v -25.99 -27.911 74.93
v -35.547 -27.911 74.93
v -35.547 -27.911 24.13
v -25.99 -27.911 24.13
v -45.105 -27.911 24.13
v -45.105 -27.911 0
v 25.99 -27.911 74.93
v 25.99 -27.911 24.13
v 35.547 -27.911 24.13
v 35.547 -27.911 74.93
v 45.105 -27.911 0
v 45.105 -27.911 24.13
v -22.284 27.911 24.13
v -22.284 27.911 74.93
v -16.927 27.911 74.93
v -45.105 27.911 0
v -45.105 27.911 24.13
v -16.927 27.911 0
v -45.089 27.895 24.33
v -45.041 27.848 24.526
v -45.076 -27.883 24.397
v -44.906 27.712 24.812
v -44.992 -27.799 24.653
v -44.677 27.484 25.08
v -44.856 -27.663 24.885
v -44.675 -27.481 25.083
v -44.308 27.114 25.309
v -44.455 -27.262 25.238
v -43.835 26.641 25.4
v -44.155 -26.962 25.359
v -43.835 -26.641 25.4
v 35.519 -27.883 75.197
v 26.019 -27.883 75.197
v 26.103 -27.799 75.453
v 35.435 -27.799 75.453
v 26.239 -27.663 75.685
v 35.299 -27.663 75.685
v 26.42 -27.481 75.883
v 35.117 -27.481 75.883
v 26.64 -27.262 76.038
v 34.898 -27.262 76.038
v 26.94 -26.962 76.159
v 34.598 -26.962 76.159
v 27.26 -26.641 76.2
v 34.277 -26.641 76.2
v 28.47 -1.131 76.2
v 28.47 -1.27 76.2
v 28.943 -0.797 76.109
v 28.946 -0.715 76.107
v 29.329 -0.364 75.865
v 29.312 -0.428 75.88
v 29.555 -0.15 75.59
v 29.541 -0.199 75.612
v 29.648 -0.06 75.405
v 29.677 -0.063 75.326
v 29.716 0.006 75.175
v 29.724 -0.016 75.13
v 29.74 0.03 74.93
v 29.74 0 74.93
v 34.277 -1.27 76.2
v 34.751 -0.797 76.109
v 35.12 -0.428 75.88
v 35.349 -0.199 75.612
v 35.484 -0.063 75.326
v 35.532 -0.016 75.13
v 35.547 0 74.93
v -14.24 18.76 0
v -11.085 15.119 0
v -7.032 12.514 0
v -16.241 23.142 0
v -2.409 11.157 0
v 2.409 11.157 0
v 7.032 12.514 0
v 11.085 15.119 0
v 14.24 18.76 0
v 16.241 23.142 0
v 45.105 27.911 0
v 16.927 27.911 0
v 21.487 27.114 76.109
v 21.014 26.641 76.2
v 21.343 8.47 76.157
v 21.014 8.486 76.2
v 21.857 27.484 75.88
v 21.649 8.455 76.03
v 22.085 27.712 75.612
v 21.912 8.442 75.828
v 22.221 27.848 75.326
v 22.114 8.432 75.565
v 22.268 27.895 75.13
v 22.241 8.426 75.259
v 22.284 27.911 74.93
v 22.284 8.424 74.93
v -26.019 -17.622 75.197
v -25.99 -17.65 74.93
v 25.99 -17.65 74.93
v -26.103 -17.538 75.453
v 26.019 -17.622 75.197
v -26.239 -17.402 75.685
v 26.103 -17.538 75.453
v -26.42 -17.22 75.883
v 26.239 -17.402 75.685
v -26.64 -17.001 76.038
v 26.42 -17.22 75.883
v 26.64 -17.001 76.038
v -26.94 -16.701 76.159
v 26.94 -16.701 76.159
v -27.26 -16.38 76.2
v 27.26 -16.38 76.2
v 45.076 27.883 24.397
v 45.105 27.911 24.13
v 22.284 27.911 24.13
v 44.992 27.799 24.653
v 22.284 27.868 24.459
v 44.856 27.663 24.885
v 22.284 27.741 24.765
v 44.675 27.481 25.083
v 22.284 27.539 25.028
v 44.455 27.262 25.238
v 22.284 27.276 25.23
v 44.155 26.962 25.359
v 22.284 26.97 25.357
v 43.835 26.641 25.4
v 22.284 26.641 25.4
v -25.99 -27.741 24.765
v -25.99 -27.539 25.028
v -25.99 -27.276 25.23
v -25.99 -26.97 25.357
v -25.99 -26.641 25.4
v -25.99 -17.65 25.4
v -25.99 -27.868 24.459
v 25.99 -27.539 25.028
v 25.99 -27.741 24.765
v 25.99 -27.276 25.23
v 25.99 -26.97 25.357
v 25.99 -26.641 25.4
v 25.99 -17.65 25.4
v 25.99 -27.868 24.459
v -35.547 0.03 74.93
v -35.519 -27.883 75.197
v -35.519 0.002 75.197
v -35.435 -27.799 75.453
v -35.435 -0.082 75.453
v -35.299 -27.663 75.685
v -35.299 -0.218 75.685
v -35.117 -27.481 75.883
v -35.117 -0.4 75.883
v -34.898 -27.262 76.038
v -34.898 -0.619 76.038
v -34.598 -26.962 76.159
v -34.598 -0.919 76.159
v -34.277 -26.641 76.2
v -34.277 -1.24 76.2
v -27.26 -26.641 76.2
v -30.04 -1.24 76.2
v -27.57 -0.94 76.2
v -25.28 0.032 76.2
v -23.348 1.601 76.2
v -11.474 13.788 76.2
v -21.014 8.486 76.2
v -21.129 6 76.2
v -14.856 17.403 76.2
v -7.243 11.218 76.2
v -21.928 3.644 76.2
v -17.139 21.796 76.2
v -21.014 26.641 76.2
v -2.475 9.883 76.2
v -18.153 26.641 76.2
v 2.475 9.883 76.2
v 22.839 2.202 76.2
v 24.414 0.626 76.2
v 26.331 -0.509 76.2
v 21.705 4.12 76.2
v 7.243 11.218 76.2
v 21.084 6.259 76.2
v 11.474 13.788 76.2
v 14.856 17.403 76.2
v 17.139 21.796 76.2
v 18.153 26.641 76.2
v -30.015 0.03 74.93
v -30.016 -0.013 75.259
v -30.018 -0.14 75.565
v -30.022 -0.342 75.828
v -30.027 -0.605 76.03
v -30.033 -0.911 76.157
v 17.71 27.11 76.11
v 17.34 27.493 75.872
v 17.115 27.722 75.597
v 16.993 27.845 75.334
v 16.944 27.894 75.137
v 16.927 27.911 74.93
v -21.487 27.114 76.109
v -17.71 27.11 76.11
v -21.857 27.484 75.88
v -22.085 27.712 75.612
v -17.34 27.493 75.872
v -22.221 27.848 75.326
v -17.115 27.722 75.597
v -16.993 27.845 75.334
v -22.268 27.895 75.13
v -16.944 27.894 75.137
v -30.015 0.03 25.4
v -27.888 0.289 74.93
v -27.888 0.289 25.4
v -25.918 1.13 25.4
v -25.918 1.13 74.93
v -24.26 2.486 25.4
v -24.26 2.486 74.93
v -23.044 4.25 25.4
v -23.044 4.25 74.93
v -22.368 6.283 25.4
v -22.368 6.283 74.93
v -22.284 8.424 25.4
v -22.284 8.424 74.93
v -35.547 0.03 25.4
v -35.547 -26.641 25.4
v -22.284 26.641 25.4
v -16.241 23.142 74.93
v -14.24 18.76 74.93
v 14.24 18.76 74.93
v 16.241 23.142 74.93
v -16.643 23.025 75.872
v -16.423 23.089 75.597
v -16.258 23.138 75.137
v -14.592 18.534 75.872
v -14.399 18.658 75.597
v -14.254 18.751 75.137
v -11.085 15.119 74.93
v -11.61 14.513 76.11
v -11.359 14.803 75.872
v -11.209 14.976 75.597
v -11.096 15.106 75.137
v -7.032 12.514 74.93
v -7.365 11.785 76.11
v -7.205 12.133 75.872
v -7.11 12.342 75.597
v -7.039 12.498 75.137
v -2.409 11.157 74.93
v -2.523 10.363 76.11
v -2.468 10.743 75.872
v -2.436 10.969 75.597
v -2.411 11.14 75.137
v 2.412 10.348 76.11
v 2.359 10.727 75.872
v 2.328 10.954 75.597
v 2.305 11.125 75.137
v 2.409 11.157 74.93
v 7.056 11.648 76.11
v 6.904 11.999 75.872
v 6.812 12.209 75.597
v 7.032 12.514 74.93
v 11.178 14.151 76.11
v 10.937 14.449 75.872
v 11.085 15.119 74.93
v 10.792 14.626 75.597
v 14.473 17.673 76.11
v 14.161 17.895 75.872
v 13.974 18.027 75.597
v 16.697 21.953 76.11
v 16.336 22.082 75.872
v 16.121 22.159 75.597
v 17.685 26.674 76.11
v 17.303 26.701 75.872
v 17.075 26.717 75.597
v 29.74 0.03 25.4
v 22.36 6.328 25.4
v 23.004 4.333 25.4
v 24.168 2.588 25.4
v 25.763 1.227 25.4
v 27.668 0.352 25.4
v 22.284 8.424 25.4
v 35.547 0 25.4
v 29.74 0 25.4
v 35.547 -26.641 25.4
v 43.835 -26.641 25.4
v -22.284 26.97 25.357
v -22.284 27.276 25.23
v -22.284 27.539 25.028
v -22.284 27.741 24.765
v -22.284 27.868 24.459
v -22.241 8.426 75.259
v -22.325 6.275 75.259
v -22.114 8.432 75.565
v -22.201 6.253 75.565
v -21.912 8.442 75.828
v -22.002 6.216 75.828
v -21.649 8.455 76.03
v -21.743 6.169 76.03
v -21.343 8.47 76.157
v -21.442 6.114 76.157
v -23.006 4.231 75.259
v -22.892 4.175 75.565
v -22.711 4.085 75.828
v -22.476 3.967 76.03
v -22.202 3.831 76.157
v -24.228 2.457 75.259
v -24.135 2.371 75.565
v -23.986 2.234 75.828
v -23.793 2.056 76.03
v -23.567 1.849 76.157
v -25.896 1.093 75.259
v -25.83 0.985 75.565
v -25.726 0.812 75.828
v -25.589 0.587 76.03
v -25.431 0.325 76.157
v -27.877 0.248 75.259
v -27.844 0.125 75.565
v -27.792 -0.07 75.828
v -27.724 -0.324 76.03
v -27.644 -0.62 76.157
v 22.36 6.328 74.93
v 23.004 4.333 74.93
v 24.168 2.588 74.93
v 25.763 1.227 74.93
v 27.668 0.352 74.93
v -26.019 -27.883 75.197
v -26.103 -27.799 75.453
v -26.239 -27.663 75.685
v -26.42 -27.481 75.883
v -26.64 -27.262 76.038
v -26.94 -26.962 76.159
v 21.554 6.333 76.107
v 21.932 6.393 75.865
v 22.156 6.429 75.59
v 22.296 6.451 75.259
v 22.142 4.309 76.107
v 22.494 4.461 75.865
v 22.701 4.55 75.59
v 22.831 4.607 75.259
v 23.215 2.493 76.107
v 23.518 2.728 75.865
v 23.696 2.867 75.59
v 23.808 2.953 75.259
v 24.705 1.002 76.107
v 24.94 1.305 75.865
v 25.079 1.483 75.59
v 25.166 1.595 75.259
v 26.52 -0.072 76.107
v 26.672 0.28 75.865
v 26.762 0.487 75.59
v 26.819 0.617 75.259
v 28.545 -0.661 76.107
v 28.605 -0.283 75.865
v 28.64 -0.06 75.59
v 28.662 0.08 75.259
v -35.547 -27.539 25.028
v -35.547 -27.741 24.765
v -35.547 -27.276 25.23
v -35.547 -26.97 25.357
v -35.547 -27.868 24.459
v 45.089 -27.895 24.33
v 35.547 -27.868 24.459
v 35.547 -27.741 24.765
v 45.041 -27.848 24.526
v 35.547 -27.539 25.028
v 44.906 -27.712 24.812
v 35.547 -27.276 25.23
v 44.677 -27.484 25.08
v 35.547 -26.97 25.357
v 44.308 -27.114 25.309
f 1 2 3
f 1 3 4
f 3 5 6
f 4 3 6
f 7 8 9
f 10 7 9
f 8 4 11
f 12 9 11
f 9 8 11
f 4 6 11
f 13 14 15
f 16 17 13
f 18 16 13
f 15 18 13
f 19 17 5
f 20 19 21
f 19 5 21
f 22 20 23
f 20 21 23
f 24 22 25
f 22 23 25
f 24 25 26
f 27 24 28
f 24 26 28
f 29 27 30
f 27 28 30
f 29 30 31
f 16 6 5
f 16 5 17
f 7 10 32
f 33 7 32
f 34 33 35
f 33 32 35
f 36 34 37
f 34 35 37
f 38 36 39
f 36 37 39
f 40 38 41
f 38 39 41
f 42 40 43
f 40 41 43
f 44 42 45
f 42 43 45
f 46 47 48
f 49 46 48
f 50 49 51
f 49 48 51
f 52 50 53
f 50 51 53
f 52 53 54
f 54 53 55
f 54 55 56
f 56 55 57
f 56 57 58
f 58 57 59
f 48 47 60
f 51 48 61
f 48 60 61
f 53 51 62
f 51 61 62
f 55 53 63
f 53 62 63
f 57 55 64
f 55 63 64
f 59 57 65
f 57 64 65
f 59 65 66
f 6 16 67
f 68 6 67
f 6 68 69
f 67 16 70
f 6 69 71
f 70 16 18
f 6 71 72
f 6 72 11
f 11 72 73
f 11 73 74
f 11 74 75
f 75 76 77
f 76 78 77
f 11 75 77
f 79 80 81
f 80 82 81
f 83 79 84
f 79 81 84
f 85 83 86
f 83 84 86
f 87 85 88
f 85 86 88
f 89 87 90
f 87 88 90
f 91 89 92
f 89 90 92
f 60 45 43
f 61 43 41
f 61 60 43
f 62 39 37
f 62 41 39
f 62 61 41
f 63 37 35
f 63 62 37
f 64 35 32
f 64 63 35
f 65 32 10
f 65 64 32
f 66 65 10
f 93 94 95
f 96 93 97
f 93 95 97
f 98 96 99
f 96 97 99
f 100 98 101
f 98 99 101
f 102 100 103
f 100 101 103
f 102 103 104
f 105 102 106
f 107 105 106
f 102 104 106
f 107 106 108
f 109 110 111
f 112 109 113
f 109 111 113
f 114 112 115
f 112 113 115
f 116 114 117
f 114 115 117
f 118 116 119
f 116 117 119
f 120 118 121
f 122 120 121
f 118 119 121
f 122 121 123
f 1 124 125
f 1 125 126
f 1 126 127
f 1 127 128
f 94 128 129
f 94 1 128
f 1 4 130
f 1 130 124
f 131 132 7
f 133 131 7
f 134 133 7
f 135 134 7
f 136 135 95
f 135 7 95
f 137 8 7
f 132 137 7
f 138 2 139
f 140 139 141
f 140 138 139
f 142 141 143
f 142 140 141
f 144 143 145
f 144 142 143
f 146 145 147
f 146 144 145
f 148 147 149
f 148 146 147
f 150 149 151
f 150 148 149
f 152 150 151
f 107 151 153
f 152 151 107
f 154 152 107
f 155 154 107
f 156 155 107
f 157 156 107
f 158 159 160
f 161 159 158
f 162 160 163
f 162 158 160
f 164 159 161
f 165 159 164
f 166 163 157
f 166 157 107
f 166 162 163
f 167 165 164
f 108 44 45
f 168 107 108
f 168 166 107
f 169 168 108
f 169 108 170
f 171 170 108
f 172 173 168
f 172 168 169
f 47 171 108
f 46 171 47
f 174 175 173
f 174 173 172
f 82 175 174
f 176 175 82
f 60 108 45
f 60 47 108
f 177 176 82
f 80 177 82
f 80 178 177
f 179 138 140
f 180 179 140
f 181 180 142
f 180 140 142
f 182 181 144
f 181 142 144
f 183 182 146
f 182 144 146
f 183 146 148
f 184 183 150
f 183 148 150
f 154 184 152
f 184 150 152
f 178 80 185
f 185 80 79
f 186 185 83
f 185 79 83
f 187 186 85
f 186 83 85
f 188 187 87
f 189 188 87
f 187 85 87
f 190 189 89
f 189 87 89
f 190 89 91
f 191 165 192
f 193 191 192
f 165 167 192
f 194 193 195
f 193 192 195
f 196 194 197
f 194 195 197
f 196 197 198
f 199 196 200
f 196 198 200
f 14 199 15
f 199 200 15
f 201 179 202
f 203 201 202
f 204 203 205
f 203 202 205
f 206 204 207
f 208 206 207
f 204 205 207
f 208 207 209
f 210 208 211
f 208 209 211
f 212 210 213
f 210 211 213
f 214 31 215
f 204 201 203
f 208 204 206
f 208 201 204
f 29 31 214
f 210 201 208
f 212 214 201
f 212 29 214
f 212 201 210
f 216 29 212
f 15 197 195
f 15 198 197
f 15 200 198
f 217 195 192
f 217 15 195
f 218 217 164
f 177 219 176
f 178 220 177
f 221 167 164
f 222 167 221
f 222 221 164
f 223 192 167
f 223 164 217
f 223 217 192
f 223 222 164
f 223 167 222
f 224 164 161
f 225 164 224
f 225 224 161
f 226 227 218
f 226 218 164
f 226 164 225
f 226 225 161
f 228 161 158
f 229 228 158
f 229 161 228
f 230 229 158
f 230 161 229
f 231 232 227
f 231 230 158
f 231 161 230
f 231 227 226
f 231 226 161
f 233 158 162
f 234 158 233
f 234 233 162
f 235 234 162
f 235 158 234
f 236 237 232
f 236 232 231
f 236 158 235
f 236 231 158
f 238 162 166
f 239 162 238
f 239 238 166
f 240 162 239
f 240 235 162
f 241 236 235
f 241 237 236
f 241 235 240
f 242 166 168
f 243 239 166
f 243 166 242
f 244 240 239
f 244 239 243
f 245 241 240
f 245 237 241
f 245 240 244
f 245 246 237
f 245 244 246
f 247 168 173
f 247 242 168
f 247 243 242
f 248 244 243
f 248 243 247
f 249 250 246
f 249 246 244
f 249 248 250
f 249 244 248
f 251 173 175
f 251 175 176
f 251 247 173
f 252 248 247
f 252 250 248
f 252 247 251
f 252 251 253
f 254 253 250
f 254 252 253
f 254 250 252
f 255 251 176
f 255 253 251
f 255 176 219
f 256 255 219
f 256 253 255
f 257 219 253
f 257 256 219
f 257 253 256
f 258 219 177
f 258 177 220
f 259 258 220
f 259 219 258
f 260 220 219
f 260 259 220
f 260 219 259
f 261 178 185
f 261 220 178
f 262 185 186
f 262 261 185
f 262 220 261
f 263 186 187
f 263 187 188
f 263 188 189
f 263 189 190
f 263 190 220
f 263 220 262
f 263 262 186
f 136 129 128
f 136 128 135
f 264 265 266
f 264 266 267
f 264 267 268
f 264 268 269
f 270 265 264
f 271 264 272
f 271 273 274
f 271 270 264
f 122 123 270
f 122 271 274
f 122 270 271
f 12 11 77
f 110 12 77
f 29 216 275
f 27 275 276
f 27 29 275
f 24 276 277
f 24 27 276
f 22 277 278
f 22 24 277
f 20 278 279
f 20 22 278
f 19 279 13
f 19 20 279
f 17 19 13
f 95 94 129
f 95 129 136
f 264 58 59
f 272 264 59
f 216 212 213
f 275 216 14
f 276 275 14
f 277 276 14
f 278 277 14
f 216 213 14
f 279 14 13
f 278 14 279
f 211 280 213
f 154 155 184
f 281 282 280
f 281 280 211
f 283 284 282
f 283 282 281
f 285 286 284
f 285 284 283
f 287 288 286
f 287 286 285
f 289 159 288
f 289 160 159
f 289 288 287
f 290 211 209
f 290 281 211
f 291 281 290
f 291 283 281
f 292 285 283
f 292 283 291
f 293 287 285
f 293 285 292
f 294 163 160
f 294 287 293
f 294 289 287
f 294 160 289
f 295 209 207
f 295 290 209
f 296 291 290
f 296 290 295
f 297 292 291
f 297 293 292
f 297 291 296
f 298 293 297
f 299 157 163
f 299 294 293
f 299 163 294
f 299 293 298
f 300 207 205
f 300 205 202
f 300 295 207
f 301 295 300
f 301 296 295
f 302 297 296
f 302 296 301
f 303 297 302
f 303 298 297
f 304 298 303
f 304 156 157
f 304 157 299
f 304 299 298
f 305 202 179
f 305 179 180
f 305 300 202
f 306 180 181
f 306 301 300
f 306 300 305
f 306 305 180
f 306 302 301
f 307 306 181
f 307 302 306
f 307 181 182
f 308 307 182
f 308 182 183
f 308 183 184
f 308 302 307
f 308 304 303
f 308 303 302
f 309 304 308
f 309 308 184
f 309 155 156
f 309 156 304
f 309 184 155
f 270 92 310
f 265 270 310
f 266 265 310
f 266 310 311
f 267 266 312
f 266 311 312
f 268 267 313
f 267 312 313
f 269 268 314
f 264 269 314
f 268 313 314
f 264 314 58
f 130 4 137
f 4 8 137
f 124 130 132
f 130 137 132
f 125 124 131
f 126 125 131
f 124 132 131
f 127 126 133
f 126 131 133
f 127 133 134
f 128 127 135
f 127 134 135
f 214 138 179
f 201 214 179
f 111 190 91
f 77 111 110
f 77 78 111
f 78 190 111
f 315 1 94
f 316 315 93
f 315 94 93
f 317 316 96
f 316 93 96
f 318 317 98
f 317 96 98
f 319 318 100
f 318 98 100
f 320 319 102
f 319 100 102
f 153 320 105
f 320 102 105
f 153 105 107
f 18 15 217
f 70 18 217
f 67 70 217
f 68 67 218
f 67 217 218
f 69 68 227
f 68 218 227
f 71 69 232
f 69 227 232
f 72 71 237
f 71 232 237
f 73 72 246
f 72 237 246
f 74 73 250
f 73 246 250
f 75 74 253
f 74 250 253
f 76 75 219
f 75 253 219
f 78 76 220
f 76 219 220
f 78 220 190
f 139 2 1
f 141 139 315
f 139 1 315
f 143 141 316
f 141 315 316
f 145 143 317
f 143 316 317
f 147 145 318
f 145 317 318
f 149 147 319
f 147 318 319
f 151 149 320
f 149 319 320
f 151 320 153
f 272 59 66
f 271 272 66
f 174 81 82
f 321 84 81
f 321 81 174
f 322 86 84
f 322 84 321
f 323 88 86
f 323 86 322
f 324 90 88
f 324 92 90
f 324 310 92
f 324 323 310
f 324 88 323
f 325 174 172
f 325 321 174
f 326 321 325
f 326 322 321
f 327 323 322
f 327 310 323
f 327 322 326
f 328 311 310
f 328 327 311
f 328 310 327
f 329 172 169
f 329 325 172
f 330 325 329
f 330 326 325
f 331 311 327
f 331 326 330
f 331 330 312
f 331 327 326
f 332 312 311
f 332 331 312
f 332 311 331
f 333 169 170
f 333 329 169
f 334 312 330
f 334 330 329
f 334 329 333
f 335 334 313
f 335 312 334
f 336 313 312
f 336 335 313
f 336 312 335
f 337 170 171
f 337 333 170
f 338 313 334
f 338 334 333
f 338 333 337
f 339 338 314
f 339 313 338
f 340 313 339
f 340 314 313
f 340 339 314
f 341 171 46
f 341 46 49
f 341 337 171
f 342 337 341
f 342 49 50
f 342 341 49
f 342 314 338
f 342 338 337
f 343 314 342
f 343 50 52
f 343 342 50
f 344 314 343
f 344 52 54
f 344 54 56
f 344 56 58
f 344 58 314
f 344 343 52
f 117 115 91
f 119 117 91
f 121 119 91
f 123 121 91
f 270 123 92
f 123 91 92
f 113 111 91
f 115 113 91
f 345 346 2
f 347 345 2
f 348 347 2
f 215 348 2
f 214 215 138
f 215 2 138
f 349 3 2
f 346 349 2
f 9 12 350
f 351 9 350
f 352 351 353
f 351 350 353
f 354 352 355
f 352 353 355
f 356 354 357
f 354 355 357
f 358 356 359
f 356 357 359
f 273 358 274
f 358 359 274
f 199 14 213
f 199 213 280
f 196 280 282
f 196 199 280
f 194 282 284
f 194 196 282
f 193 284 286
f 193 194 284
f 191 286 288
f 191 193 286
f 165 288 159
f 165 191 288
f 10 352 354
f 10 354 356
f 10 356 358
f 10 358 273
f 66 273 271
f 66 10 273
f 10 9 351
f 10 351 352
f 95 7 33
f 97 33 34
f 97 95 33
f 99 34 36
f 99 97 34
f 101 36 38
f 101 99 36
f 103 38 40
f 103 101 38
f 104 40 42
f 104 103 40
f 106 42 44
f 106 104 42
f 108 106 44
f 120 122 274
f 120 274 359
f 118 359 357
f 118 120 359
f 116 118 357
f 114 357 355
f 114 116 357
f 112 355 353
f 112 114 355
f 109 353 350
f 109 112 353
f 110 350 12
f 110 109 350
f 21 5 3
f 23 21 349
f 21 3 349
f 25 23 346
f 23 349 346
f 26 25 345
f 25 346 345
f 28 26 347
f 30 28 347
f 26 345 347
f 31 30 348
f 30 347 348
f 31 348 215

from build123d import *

# Parameters (mm, degrees)
F0_W     = 90.20937762
F0_H     = 55.82251726
F1_DEPTH = 76.2
F2_R     = 16.9269763234
F3_DEPTH = 76.2
F4_W     = 51.9804880023
F4_H     = 10.2611703347
F5_DEPTH = 50.8
F6_R     = 7.62
F7_DEPTH = 50.8
F8_W     = 9.5572224044
F8_H     = 27.9414801582
F8_H_2   = 27.91125863
F9_DEPTH = 50.8
F10_R    = 1.27


with BuildPart() as f1:
    # F0 (on Top) → F1 (new body)
    with BuildSketch(Plane.XY):
        Rectangle(F0_W, F0_H)
    extrude(amount=F1_DEPTH)

    # F2 (on face) → F3 (cut)
    with BuildSketch(Plane.XY.offset(76.2)):
        with Locations((0, 27.91125863)):
            Circle(F2_R)
    extrude(amount=-F3_DEPTH, mode=Mode.SUBTRACT)

    # F4 (on face) → F5 (cut)
    with BuildSketch(Plane.XY.offset(76.2)):
        with Locations((0, -22.7806734627)):
            Rectangle(F4_W, F4_H)
    extrude(amount=-F5_DEPTH, mode=Mode.SUBTRACT)

    # F6 (on face) → F7 (cut)
    with BuildSketch(Plane.XY.offset(76.2)):
        with Locations((-29.86468881, 7.64874137)):
            Circle(F6_R)
        with Locations((29.86468881, 7.64874137)):
            Circle(F6_R)
    extrude(amount=-F7_DEPTH, mode=Mode.SUBTRACT)

    # F8 (on face) → F9 (cut)
    with BuildSketch(Plane.XY.offset(76.2)):
        with BuildLine():
            Line((-22.2841894419, 27.91125863), (-45.10468881, 27.91125863))
            Line((-45.10468881, 27.91125863), (-45.10468881, 6.8738676186))
            Line((-45.10468881, 6.8738676186), (-37.4451881781, 6.8738676186))
            ThreePointArc((-37.4451881781, 6.8738676186), (-30.6395625614, 15.2292407381), (-22.2841894419, 8.4236151214))
            Line((-22.2841894419, 8.4236151214), (-22.2841894419, 27.91125863))
        make_face()
        with BuildLine():
            Line((-37.4451881781, 6.8738676186), (-45.10468881, 6.8738676186))
            Line((-45.10468881, 6.8738676186), (-45.10468881, 0.0302215282))
            Line((-45.10468881, 0.0302215282), (-35.5474664056, 0.0302215282))
            Line((-35.5474664056, 0.0302215282), (-30.0148734284, 0.0302215282))
            ThreePointArc((-30.0148734284, 0.0302215282), (-35.0270275898, 2.0438632873), (-37.4451881781, 6.8738676186))
        make_face()
        with Locations((-40.3260776078, -13.9405185509)):
            Rectangle(F8_W, F8_H)
        with BuildLine():
            Line((45.10468881, 27.91125863), (22.2841894419, 27.91125863))
            Line((22.2841894419, 27.91125863), (22.2841894419, 8.4236151214))
            ThreePointArc((22.2841894419, 8.4236151214), (30.2526287637, 15.2588598048), (37.48468881, 7.64874137))
            ThreePointArc((37.48468881, 7.64874137), (37.4748072448, 7.2608014163), (37.4451881781, 6.8738676186))
            Line((37.4451881781, 6.8738676186), (45.10468881, 6.8738676186))
            Line((45.10468881, 6.8738676186), (45.10468881, 27.91125863))
        make_face()
        with BuildLine():
            Line((45.10468881, 0), (45.10468881, 6.8738676186))
            Line((45.10468881, 6.8738676186), (37.4451881781, 6.8738676186))
            ThreePointArc((37.4451881781, 6.8738676186), (34.9251180007, 1.9516845504), (29.7400578856, 0.0297606552))
            Line((29.7400578856, 0.0297606552), (29.7400578856, 0))
            Line((29.7400578856, 0), (35.5474664056, 0))
            Line((35.5474664056, 0), (45.10468881, 0))
        make_face()
        with Locations((40.3260776078, -13.955629315)):
            Rectangle(F8_W, F8_H_2)
    extrude(amount=-F9_DEPTH, mode=Mode.SUBTRACT)

    # F10
    f10_edges = [f1.edges().sort_by_distance(p)[0] for p in [
        (-33.694439, 27.911259, 25.4),
        (33.694439, 27.911259, 25.4),
        (19.605583, 27.911259, 76.2),
        (-19.605583, 27.911259, 76.2),
        (0, 10.984282, 76.2),
        (25.990244, -22.780673, 76.2),
        (30.768855, -27.911259, 76.2),
        (35.547466, -13.955629, 76.2),
        (32.643762, 0, 76.2),
        (29.740058, 0.01488, 76.2),
        (24.167632, 2.588312, 76.2),
        (22.284189, 18.167437, 76.2),
        (-22.284189, 18.167437, 76.2),
        (-24.259811, 2.486403, 76.2),
        (-32.78117, 0.030222, 76.2),
        (-35.547466, -13.940519, 76.2),
        (-30.768855, -27.911259, 76.2),
        (-25.990244, -22.780673, 76.2),
        (0, -17.650088, 76.2),
        (0, -27.911259, 25.4),
        (-40.326078, -27.911259, 25.4),
        (-45.104689, 0, 25.4),
        (45.104689, 0, 25.4),
        (40.326078, -27.911259, 25.4),
    ]]
    fillet(f10_edges, radius=F10_R)


solid = f1.part
